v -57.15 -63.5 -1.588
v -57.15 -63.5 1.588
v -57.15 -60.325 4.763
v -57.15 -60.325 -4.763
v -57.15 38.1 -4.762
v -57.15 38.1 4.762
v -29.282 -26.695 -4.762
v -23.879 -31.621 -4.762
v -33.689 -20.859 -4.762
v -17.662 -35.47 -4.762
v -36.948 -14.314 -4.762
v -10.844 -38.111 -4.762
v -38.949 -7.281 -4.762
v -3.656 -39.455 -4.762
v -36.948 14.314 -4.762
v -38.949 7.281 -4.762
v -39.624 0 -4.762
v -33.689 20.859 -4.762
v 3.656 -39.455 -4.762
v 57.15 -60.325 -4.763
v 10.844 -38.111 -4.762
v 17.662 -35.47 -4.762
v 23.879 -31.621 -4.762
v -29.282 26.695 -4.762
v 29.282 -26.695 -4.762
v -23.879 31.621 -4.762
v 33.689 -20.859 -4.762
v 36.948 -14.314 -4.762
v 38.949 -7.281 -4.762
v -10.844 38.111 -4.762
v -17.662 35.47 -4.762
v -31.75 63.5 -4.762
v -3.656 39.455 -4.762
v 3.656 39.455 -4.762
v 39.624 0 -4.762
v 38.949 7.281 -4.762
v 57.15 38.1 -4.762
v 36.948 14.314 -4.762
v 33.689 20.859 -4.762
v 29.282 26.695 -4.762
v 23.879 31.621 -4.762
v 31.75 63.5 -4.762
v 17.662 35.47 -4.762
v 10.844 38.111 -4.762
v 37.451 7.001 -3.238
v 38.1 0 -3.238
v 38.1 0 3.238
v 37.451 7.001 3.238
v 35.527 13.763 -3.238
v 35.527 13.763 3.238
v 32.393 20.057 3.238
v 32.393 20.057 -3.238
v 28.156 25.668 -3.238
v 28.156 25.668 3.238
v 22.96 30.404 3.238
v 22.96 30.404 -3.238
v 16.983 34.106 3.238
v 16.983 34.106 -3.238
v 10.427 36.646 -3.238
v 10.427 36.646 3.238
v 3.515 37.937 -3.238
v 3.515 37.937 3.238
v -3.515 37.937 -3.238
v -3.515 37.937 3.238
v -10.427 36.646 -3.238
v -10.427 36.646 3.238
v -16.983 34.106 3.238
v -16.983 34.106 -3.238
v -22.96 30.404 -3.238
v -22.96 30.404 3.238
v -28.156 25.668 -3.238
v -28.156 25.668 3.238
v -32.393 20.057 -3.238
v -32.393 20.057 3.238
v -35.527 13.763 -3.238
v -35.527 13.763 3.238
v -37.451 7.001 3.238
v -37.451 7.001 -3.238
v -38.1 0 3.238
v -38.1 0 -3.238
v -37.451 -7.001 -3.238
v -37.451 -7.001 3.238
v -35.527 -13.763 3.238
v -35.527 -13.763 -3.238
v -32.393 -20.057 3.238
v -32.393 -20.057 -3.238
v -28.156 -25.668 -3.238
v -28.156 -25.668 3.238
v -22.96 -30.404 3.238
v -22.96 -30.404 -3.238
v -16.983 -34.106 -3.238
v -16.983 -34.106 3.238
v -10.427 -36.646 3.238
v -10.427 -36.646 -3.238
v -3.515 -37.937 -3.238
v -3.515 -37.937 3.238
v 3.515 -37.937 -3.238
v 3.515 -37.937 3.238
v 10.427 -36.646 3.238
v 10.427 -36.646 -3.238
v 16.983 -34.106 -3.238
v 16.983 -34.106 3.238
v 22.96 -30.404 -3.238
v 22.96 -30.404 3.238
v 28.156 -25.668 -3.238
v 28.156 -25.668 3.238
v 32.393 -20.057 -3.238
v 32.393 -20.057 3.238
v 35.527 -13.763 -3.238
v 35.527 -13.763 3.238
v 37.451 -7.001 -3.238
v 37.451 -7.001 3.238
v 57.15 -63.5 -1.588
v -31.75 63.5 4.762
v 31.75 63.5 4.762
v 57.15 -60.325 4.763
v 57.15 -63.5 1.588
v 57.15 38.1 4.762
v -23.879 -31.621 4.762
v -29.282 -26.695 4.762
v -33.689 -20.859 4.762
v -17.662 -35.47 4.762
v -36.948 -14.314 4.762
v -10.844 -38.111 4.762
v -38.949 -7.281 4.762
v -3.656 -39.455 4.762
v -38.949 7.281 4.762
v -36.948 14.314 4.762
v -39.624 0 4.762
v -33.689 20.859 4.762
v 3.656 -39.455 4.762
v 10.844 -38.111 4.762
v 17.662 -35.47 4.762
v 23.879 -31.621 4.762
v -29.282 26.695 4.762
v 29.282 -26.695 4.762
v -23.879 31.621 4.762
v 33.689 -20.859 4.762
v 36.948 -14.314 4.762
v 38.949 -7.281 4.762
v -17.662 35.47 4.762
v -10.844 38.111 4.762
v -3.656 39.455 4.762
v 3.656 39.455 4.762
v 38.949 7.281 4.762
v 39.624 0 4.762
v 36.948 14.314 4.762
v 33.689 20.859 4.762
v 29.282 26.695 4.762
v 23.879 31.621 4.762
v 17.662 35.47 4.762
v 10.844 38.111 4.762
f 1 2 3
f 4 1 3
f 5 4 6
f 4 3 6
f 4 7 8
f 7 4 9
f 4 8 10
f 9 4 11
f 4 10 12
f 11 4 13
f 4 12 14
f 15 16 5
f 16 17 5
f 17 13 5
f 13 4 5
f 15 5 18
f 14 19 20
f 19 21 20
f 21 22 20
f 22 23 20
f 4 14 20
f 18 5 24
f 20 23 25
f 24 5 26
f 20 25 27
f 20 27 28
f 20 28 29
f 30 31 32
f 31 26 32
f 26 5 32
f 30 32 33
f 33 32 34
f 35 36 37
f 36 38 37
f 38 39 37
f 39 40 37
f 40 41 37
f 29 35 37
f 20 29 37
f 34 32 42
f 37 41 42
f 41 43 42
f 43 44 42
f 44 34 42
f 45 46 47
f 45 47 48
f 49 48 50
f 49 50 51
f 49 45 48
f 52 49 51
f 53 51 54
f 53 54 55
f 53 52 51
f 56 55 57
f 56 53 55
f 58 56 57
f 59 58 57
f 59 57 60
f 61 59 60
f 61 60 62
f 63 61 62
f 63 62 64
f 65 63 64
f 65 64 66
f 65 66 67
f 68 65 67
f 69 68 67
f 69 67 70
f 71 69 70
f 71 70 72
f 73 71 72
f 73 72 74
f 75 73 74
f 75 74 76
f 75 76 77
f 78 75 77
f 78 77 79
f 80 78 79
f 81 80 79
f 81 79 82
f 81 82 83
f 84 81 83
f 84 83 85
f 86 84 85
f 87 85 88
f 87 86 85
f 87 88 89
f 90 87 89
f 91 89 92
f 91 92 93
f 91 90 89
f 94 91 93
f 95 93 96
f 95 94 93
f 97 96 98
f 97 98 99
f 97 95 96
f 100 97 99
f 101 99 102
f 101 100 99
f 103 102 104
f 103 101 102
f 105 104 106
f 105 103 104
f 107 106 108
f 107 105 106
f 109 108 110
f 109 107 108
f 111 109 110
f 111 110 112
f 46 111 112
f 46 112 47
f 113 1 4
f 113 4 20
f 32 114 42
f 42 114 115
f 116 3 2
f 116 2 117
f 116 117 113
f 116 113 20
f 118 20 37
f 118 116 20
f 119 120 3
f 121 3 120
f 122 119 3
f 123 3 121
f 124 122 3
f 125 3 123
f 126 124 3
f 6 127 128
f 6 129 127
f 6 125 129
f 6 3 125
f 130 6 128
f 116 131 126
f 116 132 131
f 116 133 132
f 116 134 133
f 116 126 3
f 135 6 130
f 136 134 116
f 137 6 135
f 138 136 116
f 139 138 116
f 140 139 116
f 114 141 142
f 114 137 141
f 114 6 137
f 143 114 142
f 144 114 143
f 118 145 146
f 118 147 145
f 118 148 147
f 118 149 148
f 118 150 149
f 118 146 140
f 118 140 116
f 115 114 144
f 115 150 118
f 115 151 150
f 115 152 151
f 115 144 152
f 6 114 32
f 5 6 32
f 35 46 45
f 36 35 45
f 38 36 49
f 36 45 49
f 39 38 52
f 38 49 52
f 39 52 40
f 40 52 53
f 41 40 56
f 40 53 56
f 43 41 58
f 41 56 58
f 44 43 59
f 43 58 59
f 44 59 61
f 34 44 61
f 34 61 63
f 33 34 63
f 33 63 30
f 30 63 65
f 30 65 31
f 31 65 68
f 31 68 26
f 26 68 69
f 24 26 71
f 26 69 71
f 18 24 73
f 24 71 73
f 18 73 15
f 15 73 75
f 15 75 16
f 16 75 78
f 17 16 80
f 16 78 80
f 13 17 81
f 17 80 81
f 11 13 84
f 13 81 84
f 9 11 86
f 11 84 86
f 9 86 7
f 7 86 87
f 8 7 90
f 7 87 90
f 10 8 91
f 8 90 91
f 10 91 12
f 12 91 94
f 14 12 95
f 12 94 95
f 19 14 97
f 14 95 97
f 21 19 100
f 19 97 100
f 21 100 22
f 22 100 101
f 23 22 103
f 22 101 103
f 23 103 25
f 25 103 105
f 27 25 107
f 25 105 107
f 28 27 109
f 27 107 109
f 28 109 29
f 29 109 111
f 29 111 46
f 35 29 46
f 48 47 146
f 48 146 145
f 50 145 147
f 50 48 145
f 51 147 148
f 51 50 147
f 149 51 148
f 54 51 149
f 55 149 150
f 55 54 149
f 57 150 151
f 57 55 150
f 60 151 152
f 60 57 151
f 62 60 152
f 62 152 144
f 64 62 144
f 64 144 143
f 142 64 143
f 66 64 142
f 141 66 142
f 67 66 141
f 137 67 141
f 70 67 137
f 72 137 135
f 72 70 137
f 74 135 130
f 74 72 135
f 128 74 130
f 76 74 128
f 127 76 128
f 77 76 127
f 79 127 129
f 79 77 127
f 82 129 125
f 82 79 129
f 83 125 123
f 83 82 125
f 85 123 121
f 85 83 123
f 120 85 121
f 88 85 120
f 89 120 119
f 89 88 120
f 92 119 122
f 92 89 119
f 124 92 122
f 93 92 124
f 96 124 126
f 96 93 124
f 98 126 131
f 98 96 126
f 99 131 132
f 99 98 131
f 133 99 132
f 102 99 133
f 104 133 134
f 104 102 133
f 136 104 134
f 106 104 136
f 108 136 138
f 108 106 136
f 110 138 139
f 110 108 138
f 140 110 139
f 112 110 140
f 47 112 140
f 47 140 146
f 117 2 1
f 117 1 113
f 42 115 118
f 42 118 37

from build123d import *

# Parameters (mm, degrees)
F0_W     = 114.3
F0_H     = 127
F0_R     = 38.1
F1_DEPTH = 4.7625
F2_SIZE  = 25.4
F3_SIZE  = 1.524
F4_SIZE  = 3.175


with BuildPart() as f1:
    # F0 (on Top) → F1 (new body, symmetric)
    with BuildSketch(Plane.XY):
        Rectangle(F0_W, F0_H)
        Circle(F0_R, mode=Mode.SUBTRACT)
    extrude(amount=F1_DEPTH, both=True)

    # F2
    f2_edges = [f1.edges().sort_by_distance(p)[0] for p in [
        (57.15, 63.5, 0),
        (-57.15, 63.5, 0),
    ]]
    chamfer(f2_edges, length=F2_SIZE)

    # F3
    f3_edges = [f1.edges().sort_by_distance(p)[0] for p in [
        (-38.1, 0, 4.7625),
        (-38.1, 0, -4.7625),
    ]]
    chamfer(f3_edges, length=F3_SIZE)

    # F4
    f4_edges = [f1.edges().sort_by_distance(p)[0] for p in [
        (0, -63.5, 4.7625),
        (0, -63.5, -4.7625),
    ]]
    chamfer(f4_edges, length=F4_SIZE)


solid = f1.part
